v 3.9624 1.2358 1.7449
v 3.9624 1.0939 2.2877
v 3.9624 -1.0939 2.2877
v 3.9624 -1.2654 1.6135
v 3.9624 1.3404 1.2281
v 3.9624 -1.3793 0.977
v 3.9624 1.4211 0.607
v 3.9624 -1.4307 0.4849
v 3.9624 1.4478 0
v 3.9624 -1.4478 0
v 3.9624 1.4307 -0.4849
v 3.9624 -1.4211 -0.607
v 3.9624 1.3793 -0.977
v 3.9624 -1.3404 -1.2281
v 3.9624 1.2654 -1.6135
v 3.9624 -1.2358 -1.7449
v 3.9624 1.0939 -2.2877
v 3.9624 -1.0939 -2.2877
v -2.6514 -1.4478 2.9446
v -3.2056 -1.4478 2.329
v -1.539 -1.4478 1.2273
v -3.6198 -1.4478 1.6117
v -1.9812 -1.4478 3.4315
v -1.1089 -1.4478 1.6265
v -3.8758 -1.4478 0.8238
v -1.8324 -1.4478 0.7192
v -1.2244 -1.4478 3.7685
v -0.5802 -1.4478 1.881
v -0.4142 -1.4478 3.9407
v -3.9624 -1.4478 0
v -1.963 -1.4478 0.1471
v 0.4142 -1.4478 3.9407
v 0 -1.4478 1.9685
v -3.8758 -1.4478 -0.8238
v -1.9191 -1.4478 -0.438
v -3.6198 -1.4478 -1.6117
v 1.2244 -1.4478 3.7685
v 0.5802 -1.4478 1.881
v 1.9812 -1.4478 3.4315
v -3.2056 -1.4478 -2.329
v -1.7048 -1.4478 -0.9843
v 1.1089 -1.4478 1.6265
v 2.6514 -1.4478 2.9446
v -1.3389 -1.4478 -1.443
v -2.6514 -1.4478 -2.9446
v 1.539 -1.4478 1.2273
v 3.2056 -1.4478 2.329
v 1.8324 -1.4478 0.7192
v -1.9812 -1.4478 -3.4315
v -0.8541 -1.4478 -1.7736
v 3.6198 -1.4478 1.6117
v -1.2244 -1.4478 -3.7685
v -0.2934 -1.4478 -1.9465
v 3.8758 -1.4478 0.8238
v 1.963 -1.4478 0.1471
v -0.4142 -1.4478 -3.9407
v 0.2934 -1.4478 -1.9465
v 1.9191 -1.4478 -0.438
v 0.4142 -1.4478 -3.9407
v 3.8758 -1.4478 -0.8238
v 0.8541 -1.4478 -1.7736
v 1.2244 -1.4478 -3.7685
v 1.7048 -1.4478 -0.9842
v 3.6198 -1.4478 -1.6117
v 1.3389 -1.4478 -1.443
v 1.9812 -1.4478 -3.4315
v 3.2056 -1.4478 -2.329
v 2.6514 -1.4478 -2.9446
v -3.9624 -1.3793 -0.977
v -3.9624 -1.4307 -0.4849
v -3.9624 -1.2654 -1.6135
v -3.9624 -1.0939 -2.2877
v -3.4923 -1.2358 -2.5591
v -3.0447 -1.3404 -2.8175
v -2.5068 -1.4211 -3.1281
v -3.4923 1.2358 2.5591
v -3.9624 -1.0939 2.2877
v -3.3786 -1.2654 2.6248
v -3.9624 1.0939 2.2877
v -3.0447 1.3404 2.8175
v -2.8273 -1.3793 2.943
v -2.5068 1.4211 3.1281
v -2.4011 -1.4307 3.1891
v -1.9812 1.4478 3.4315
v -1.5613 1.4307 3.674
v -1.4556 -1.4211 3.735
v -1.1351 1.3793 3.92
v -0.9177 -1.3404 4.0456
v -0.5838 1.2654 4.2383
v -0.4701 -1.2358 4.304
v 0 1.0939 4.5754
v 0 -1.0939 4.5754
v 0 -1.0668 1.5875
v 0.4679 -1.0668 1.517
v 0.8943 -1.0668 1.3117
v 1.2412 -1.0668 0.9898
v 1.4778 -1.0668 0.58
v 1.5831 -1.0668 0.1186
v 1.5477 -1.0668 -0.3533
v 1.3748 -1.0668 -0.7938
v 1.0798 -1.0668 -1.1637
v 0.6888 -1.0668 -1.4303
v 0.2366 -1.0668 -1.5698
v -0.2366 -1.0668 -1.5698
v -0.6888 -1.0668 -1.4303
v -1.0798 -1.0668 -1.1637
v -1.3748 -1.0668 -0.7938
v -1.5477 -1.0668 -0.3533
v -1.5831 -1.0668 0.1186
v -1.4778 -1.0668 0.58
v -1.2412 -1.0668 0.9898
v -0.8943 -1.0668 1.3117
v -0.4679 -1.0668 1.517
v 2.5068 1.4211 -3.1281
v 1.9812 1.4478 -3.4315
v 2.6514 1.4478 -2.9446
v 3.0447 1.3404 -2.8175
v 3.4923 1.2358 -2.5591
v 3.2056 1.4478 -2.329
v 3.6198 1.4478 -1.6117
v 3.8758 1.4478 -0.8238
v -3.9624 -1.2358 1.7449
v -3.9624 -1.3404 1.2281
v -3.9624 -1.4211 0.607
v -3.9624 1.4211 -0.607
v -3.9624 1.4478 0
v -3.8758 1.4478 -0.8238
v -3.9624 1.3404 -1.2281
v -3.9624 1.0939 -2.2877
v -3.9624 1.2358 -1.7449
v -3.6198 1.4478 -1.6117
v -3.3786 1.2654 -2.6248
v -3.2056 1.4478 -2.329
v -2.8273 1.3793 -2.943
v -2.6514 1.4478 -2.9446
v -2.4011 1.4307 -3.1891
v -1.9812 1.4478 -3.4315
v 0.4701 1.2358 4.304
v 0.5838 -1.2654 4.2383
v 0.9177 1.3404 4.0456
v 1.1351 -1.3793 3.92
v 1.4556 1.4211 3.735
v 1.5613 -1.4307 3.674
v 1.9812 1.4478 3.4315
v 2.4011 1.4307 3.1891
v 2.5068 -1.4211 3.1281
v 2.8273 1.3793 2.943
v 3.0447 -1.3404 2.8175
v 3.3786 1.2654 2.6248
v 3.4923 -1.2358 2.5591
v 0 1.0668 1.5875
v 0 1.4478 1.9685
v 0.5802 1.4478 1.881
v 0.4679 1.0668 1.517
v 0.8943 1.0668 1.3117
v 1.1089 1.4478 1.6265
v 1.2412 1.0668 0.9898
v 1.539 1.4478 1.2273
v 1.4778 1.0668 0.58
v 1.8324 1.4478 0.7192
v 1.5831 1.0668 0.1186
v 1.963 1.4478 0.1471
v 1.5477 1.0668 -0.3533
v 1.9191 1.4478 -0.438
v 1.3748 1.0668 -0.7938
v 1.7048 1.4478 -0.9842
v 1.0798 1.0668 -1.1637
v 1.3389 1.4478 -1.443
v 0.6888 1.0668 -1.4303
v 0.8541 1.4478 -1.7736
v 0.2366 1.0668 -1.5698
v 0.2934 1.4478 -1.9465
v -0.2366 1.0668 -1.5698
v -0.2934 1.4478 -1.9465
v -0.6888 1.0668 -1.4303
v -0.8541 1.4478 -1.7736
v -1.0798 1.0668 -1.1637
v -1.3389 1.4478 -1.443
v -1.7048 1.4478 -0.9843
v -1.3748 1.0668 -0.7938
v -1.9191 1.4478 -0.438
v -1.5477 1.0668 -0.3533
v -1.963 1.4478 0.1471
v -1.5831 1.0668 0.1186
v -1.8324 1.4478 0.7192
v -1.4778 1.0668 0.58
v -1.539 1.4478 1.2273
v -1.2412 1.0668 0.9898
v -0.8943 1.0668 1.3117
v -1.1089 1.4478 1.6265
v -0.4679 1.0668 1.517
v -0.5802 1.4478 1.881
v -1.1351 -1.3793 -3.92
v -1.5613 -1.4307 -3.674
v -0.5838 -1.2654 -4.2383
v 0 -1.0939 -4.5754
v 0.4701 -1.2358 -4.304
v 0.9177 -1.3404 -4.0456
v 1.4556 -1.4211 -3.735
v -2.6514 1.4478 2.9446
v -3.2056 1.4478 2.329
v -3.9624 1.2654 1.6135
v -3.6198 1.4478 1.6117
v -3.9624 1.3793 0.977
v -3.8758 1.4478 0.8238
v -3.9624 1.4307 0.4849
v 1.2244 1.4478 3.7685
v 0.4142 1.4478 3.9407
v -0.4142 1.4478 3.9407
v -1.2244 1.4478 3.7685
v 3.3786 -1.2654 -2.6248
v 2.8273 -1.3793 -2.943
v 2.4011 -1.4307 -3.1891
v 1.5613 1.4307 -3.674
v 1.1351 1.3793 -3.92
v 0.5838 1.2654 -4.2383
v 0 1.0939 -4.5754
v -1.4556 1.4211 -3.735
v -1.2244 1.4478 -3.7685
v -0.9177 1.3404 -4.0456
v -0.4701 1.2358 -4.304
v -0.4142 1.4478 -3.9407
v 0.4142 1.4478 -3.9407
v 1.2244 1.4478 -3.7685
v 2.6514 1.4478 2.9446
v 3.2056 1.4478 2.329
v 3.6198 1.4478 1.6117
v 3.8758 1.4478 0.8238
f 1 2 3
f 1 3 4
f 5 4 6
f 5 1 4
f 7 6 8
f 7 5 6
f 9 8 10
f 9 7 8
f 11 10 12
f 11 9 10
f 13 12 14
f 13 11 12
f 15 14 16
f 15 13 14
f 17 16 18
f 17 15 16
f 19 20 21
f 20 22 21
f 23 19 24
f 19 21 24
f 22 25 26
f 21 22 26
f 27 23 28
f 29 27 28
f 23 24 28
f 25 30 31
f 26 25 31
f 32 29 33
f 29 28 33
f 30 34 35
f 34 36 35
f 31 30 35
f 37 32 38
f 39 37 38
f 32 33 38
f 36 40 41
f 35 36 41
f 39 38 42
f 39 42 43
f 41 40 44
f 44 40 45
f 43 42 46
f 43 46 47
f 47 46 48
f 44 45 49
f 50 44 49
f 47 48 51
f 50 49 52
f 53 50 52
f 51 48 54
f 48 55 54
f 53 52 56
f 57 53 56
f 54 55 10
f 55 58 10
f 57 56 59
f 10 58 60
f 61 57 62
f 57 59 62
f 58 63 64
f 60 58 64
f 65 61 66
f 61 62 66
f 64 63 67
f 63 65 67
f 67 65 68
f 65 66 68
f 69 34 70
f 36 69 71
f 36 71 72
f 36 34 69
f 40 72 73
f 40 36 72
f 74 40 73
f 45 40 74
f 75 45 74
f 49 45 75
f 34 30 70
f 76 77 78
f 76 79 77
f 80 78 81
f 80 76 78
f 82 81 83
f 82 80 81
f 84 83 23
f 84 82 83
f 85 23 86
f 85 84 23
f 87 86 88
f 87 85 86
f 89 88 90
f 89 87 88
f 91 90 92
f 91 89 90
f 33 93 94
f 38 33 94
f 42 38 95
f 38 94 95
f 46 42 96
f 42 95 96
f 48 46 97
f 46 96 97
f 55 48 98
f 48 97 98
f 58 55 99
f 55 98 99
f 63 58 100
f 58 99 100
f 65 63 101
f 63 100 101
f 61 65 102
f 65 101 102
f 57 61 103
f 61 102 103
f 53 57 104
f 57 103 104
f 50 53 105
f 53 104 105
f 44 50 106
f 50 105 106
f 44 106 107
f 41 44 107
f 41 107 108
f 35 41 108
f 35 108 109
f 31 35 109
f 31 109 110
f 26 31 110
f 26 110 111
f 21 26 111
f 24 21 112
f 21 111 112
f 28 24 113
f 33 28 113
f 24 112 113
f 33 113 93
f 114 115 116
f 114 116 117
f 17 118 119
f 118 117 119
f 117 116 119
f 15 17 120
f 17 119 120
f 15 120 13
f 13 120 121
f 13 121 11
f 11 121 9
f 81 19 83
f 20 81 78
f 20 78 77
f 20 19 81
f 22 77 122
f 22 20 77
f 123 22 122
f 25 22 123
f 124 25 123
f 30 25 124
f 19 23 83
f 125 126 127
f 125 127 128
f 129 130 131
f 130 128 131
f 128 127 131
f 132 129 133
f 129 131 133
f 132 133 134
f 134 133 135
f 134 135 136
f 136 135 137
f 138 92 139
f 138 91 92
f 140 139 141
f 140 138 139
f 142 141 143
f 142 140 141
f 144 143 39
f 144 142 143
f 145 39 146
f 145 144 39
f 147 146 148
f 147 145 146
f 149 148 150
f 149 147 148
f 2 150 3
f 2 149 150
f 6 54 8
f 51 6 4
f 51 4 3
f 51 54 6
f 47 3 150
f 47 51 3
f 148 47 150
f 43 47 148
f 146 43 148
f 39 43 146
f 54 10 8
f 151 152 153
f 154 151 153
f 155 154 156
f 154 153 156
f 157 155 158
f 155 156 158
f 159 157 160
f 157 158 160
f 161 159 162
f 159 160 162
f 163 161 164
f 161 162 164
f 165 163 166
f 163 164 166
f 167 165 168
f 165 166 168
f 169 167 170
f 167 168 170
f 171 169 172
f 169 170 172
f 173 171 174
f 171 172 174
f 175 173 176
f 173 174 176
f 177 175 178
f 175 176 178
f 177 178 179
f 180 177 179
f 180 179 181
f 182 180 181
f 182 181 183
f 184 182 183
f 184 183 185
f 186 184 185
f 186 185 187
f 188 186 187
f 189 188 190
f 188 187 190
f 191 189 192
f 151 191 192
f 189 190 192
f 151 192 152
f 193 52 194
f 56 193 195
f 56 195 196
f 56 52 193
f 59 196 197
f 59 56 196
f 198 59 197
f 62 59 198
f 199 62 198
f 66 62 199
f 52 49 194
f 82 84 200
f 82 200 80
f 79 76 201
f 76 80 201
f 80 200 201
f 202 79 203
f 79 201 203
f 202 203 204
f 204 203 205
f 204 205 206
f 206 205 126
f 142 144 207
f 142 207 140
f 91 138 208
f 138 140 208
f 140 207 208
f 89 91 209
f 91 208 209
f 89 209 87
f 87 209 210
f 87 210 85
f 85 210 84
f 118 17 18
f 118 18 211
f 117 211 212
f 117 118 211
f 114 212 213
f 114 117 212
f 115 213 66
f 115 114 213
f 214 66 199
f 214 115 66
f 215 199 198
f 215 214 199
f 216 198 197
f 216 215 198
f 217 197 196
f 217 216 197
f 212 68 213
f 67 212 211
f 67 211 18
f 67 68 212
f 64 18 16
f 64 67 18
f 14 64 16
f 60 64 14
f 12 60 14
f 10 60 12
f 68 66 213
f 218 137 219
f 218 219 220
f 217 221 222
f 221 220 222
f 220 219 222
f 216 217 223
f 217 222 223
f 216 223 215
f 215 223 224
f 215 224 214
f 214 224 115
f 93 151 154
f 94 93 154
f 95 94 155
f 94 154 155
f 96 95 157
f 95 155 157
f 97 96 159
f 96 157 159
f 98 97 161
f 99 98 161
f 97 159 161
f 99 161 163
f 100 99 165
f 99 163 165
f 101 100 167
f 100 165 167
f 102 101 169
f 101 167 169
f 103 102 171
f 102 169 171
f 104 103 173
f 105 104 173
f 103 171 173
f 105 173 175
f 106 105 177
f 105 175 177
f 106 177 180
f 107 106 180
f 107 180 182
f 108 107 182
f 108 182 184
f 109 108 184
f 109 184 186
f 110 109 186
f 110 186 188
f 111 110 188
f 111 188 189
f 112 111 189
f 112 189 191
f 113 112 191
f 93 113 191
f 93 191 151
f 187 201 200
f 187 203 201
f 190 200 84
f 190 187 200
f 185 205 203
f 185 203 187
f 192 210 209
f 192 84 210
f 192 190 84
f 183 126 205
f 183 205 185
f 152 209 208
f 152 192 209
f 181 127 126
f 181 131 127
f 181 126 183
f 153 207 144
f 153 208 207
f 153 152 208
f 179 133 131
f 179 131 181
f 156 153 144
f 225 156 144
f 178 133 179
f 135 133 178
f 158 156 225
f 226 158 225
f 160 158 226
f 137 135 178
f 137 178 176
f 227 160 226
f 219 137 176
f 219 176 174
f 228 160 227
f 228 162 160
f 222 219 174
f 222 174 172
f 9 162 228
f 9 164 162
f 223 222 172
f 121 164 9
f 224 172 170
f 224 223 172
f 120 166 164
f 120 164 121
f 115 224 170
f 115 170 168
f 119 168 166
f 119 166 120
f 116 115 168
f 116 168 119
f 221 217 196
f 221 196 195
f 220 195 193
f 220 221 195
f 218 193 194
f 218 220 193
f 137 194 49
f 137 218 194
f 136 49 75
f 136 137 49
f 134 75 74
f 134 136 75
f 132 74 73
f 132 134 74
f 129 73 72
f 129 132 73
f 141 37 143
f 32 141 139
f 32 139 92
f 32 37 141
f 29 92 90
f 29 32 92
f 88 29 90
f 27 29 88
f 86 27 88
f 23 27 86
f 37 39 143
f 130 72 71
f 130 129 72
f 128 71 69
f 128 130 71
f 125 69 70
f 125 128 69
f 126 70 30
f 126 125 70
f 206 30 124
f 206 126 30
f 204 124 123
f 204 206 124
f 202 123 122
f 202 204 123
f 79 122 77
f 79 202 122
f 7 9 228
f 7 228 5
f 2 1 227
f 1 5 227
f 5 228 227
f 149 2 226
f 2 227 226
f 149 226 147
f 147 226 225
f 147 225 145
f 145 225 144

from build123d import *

# Parameters (mm, degrees)
BOSS_EXTRUDE1_DEPTH = 1.4478
SKETCH2_R           = 1.5875
CUT_EXTRUDE1_DEPTH  = 7.709639692
CHAMFER2_SIZE       = 0.381


with BuildPart() as part:
    # Sketch1 → Boss-Extrude1 (new, symmetric)
    with BuildSketch(Plane(origin=(0, 0, 0), x_dir=(1, 0, 0), z_dir=(0, 1, 0))):
        Polygon((0, -4.575385413), (3.9624, -2.287692707), (3.9624, 2.287692707), (0, 4.575385413), (-3.9624, 2.287692707), (-3.9624, -2.287692707), align=None)
    extrude(amount=BOSS_EXTRUDE1_DEPTH, both=True)

    # Sketch2 → Cut-Extrude1 (cut, through all)
    with BuildSketch(Plane(origin=(0, 1.4478, 0), x_dir=(1, 0, 0), z_dir=(0, 1, 0))):
        with Locations(Location((0, 0, 0), (0, 0, 270))):
            Circle(SKETCH2_R)
    extrude(amount=-CUT_EXTRUDE1_DEPTH, mode=Mode.SUBTRACT)

    # Sketch3 → Cut-Revolve2 (revolve, cut)
    with BuildSketch(Plane(origin=(0, 0, 0), x_dir=(0, 0, -1), z_dir=(1, 0, 0))):
        Polygon((-4.575385413, -1.4478), (-4.575385413, -1.093892707), (-3.9624, -1.4478), align=None)
    cut_revolve2 = revolve(axis=Axis((0, 0, 0), (0, -1, 0)), mode=Mode.SUBTRACT)

    # Mirror2: Cut-Revolve2 across plane
    add(cut_revolve2.mirror(Plane.ZX), mode=Mode.SUBTRACT)

    # Chamfer2
    chamfer2_edges = [part.edges().sort_by_distance(p)[0] for p in [
        (0, -1.4478, -1.5875),
        (0, 1.4478, -1.5875),
    ]]
    chamfer(chamfer2_edges, length=CHAMFER2_SIZE)


solid = part.part
